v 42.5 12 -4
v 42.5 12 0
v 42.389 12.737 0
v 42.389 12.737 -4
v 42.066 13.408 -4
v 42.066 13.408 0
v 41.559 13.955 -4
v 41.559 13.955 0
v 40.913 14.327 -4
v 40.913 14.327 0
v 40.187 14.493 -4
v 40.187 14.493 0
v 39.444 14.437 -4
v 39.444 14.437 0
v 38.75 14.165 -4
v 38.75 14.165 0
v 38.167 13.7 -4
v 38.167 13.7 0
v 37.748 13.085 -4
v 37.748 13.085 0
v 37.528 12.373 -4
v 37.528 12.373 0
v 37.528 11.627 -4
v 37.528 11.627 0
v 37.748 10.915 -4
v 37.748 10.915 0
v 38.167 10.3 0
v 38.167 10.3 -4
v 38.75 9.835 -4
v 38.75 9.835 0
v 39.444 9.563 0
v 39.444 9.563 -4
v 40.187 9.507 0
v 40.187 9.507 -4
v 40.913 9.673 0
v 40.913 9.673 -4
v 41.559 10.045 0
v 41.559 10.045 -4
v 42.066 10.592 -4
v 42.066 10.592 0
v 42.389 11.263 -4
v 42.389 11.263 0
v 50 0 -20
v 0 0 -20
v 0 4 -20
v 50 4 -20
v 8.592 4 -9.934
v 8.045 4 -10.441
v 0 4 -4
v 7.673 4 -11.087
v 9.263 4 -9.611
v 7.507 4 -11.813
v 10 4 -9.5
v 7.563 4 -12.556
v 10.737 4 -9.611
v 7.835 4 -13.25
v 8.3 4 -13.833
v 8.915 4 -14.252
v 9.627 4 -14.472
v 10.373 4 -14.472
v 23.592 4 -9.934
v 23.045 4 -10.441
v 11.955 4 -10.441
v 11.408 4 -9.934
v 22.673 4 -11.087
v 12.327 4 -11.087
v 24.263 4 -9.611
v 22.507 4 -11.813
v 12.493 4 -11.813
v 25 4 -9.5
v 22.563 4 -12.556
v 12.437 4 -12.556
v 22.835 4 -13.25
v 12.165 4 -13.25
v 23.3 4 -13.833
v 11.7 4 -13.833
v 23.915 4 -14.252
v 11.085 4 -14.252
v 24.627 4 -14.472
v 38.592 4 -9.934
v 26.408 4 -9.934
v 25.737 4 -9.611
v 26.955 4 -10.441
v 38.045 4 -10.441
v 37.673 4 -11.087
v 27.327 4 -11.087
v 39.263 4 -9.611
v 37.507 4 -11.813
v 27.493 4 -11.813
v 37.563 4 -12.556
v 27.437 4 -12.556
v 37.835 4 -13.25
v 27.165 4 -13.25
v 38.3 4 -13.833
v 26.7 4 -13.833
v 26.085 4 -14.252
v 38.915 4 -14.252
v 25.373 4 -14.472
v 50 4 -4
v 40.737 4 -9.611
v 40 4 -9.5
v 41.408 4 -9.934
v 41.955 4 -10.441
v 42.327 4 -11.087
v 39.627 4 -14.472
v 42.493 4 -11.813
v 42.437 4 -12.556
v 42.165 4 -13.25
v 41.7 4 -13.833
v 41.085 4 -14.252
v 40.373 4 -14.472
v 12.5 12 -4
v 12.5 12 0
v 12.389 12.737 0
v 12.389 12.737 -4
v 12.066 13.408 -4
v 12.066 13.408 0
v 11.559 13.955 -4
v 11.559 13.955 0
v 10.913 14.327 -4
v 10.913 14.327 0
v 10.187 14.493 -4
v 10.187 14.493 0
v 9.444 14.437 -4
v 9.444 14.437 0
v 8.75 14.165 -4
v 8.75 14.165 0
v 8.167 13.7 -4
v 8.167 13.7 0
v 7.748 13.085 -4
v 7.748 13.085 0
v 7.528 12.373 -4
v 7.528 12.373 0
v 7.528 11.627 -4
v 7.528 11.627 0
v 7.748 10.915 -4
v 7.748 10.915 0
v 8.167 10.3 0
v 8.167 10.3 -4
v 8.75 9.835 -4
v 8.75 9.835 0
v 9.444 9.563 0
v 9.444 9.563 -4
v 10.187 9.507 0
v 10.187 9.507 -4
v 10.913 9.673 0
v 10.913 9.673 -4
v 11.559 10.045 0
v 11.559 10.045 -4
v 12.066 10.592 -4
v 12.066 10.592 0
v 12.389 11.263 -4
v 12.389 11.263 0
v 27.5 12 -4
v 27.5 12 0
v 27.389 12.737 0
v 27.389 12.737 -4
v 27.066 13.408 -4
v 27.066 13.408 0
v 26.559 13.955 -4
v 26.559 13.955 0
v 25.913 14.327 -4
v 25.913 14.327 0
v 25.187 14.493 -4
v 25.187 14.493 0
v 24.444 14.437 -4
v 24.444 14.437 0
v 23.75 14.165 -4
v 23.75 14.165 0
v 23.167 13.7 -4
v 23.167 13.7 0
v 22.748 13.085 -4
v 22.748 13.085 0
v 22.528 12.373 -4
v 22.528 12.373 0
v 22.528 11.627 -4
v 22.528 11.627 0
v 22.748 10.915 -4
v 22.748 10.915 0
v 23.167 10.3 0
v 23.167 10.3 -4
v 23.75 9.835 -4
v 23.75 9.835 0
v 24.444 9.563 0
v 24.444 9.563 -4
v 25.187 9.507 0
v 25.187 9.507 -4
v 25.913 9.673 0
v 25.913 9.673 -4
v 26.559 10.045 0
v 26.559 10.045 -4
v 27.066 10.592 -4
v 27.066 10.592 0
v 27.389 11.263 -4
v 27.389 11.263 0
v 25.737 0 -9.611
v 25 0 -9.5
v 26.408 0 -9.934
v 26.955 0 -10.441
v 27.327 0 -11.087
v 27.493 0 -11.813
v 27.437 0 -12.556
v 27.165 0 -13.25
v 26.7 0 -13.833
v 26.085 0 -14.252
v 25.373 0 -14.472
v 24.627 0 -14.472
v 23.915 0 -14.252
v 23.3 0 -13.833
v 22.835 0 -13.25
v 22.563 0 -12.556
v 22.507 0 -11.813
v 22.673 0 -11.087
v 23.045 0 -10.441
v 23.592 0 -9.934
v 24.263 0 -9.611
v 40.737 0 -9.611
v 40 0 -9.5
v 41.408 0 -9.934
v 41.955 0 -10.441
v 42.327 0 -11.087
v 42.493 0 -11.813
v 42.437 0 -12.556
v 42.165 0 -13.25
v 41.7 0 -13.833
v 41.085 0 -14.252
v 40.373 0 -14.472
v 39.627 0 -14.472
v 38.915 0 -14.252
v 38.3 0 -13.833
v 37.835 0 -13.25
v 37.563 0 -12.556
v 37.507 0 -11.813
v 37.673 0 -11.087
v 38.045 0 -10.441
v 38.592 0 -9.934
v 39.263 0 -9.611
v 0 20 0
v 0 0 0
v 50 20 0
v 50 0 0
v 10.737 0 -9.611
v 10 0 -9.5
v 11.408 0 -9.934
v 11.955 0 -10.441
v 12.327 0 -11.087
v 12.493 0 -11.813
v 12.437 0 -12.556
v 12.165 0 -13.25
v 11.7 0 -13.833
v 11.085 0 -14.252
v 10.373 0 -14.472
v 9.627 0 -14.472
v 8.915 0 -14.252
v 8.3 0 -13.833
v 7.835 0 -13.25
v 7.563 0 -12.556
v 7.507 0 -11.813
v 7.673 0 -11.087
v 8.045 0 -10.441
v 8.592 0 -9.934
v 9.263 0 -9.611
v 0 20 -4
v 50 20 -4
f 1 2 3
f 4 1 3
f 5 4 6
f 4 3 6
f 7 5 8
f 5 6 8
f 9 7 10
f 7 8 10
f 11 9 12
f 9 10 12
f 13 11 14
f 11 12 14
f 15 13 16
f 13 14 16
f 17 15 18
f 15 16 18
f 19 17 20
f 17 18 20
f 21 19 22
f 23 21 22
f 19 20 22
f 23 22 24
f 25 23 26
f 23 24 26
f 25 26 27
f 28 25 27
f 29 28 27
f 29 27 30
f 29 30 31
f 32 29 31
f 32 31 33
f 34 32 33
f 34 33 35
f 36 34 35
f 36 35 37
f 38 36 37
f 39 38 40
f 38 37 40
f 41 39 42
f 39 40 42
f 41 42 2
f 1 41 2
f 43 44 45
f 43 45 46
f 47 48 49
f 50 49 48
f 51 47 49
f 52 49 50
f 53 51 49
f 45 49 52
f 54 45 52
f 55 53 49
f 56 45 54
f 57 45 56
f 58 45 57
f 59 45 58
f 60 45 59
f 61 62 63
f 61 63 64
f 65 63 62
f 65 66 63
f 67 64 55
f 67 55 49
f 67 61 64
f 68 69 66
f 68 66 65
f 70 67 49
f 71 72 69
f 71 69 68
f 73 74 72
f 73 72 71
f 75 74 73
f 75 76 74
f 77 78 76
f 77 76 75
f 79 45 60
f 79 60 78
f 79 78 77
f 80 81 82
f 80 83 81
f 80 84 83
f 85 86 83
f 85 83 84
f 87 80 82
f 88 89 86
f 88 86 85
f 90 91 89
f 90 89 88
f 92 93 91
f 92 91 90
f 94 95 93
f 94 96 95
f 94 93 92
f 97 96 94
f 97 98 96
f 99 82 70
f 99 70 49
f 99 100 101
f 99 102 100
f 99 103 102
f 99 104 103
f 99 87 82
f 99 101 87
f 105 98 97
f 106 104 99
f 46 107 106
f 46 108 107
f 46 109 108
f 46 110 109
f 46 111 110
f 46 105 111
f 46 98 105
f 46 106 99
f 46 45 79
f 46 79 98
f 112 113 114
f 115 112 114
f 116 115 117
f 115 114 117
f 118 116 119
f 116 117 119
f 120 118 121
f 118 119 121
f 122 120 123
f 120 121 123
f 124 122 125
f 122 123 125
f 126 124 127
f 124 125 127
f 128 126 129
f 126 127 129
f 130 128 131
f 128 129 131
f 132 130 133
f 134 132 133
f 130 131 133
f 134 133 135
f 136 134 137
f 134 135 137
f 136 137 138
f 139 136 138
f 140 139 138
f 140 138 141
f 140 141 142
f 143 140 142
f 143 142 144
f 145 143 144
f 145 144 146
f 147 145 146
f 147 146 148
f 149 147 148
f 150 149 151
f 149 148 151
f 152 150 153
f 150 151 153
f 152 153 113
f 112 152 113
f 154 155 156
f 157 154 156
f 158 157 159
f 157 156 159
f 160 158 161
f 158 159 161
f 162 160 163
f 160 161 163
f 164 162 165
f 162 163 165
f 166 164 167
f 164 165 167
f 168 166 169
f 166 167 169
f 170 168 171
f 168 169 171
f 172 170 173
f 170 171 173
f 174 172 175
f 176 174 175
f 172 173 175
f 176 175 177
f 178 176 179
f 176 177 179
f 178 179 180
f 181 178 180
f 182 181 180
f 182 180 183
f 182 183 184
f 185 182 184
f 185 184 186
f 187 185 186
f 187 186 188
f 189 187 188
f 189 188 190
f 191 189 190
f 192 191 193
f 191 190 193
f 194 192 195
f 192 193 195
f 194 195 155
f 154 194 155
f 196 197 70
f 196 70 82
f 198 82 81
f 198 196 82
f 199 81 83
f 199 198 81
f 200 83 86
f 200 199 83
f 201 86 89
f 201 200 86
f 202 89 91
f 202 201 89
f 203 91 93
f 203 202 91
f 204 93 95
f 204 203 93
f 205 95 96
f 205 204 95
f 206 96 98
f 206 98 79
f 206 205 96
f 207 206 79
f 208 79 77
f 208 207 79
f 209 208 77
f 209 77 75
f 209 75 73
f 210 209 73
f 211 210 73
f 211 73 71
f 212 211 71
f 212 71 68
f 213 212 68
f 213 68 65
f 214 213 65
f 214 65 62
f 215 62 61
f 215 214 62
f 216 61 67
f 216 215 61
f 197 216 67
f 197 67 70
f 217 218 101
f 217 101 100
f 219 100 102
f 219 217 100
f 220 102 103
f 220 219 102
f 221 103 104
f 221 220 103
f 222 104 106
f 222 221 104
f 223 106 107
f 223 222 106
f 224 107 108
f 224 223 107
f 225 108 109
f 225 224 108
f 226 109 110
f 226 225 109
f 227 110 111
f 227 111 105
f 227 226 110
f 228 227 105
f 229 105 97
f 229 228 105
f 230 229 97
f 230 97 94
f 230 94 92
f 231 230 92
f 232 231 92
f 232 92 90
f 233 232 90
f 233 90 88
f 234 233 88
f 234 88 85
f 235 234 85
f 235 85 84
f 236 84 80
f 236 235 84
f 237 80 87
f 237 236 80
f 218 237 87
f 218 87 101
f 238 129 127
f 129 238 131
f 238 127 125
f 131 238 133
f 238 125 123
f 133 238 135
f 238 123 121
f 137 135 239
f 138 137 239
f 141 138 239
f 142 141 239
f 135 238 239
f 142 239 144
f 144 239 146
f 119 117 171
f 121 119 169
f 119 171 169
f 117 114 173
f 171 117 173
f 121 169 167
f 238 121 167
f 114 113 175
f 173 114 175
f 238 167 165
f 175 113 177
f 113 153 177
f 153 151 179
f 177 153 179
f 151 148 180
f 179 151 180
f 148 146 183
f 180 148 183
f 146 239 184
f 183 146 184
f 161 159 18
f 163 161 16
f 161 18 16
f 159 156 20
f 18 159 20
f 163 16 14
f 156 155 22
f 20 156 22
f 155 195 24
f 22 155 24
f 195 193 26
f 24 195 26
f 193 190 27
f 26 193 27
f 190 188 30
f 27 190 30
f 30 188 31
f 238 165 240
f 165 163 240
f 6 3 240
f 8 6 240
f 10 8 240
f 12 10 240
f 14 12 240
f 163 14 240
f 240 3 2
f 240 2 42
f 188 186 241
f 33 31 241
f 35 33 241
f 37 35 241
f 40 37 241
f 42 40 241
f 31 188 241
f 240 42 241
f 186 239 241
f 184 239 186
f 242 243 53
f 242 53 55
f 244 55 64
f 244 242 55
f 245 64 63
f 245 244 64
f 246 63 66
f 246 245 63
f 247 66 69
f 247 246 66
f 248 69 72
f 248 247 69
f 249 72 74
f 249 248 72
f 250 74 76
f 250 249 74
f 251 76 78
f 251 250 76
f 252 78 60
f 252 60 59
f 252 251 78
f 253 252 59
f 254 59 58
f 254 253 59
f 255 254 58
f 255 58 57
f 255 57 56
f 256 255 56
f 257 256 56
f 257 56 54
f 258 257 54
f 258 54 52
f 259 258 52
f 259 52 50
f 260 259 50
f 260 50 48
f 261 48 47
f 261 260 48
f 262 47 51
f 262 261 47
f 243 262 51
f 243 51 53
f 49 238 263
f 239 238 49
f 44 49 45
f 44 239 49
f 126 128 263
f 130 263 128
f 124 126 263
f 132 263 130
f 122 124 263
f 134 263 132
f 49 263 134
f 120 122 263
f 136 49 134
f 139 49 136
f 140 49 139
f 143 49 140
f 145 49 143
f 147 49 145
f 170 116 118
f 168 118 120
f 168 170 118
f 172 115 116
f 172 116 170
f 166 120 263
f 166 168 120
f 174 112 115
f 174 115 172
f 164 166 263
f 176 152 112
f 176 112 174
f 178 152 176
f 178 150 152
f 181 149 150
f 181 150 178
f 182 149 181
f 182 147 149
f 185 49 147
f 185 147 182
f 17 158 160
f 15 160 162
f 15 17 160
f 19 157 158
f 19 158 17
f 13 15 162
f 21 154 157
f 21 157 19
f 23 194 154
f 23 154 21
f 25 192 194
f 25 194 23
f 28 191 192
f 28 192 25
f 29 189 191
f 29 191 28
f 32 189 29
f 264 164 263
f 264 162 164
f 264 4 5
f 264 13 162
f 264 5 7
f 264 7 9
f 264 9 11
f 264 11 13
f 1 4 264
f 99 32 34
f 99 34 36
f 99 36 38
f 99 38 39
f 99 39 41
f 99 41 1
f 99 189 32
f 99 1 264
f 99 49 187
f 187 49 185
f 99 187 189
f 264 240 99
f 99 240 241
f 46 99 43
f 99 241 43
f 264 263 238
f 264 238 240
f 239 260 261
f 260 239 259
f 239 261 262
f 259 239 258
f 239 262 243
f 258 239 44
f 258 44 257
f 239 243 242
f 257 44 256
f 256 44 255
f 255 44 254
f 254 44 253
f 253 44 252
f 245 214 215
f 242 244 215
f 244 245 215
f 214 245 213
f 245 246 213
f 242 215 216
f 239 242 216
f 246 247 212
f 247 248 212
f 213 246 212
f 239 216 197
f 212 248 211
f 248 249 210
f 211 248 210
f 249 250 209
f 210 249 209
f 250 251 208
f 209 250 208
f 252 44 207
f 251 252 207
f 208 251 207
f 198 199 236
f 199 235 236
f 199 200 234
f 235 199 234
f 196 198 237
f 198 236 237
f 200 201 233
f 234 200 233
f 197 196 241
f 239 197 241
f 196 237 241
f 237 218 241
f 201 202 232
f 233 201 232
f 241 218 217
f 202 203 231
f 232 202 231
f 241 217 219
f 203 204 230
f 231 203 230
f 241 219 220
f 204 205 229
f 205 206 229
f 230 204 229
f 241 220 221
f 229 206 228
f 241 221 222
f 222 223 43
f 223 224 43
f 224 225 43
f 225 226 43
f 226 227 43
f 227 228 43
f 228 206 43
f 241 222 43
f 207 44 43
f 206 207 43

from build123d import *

# Parameters (mm, degrees)
SKETCH_1_W          = 50
SKETCH_1_H          = 20
SKETCH_1_R          = 2.5
EXTRUDE_1_DEPTH     = 4
SKETCH_2_W          = 50
SKETCH_2_H          = 4
EXTRUDE_2_DEPTH     = 16
SKETCH_3_R          = 2.5
CUT_EXTRUDE_1_DEPTH = 4


with BuildPart() as part:
    # Эскиз1 → Бобышка-Вытянуть1 (new body)
    with BuildSketch(Plane(origin=(0, 0, 0), x_dir=(1, 0, 0), z_dir=(0, 1, 0))):
        with Locations((25, 10)):
            Rectangle(SKETCH_1_W, SKETCH_1_H)
        with Locations(Location((10, 12, 0), (0, 0, 270))):
            Circle(SKETCH_1_R, mode=Mode.SUBTRACT)
        with Locations(Location((40, 12, 0), (0, 0, 270))):
            Circle(SKETCH_1_R, mode=Mode.SUBTRACT)
        with Locations(Location((25, 12, 0), (0, 0, 270))):
            Circle(SKETCH_1_R, mode=Mode.SUBTRACT)
    extrude(amount=EXTRUDE_1_DEPTH)

    # Эскиз2 → Бобышка-Вытянуть2 (add)
    with BuildSketch(Plane(origin=(0, 4, 0), x_dir=(1, 0, 0), z_dir=(0, 1, 0))):
        with Locations((25, 2)):
            Rectangle(SKETCH_2_W, SKETCH_2_H)
    extrude(amount=EXTRUDE_2_DEPTH)

    # Эскиз3 → Вырез-Вытянуть1 (cut)
    with BuildSketch(Plane.XY):
        with Locations((10, 12)):
            Circle(SKETCH_3_R)
        with Locations((40, 12)):
            Circle(SKETCH_3_R)
        with Locations((25, 12)):
            Circle(SKETCH_3_R)
    extrude(amount=-CUT_EXTRUDE_1_DEPTH, mode=Mode.SUBTRACT)


solid = part.part
